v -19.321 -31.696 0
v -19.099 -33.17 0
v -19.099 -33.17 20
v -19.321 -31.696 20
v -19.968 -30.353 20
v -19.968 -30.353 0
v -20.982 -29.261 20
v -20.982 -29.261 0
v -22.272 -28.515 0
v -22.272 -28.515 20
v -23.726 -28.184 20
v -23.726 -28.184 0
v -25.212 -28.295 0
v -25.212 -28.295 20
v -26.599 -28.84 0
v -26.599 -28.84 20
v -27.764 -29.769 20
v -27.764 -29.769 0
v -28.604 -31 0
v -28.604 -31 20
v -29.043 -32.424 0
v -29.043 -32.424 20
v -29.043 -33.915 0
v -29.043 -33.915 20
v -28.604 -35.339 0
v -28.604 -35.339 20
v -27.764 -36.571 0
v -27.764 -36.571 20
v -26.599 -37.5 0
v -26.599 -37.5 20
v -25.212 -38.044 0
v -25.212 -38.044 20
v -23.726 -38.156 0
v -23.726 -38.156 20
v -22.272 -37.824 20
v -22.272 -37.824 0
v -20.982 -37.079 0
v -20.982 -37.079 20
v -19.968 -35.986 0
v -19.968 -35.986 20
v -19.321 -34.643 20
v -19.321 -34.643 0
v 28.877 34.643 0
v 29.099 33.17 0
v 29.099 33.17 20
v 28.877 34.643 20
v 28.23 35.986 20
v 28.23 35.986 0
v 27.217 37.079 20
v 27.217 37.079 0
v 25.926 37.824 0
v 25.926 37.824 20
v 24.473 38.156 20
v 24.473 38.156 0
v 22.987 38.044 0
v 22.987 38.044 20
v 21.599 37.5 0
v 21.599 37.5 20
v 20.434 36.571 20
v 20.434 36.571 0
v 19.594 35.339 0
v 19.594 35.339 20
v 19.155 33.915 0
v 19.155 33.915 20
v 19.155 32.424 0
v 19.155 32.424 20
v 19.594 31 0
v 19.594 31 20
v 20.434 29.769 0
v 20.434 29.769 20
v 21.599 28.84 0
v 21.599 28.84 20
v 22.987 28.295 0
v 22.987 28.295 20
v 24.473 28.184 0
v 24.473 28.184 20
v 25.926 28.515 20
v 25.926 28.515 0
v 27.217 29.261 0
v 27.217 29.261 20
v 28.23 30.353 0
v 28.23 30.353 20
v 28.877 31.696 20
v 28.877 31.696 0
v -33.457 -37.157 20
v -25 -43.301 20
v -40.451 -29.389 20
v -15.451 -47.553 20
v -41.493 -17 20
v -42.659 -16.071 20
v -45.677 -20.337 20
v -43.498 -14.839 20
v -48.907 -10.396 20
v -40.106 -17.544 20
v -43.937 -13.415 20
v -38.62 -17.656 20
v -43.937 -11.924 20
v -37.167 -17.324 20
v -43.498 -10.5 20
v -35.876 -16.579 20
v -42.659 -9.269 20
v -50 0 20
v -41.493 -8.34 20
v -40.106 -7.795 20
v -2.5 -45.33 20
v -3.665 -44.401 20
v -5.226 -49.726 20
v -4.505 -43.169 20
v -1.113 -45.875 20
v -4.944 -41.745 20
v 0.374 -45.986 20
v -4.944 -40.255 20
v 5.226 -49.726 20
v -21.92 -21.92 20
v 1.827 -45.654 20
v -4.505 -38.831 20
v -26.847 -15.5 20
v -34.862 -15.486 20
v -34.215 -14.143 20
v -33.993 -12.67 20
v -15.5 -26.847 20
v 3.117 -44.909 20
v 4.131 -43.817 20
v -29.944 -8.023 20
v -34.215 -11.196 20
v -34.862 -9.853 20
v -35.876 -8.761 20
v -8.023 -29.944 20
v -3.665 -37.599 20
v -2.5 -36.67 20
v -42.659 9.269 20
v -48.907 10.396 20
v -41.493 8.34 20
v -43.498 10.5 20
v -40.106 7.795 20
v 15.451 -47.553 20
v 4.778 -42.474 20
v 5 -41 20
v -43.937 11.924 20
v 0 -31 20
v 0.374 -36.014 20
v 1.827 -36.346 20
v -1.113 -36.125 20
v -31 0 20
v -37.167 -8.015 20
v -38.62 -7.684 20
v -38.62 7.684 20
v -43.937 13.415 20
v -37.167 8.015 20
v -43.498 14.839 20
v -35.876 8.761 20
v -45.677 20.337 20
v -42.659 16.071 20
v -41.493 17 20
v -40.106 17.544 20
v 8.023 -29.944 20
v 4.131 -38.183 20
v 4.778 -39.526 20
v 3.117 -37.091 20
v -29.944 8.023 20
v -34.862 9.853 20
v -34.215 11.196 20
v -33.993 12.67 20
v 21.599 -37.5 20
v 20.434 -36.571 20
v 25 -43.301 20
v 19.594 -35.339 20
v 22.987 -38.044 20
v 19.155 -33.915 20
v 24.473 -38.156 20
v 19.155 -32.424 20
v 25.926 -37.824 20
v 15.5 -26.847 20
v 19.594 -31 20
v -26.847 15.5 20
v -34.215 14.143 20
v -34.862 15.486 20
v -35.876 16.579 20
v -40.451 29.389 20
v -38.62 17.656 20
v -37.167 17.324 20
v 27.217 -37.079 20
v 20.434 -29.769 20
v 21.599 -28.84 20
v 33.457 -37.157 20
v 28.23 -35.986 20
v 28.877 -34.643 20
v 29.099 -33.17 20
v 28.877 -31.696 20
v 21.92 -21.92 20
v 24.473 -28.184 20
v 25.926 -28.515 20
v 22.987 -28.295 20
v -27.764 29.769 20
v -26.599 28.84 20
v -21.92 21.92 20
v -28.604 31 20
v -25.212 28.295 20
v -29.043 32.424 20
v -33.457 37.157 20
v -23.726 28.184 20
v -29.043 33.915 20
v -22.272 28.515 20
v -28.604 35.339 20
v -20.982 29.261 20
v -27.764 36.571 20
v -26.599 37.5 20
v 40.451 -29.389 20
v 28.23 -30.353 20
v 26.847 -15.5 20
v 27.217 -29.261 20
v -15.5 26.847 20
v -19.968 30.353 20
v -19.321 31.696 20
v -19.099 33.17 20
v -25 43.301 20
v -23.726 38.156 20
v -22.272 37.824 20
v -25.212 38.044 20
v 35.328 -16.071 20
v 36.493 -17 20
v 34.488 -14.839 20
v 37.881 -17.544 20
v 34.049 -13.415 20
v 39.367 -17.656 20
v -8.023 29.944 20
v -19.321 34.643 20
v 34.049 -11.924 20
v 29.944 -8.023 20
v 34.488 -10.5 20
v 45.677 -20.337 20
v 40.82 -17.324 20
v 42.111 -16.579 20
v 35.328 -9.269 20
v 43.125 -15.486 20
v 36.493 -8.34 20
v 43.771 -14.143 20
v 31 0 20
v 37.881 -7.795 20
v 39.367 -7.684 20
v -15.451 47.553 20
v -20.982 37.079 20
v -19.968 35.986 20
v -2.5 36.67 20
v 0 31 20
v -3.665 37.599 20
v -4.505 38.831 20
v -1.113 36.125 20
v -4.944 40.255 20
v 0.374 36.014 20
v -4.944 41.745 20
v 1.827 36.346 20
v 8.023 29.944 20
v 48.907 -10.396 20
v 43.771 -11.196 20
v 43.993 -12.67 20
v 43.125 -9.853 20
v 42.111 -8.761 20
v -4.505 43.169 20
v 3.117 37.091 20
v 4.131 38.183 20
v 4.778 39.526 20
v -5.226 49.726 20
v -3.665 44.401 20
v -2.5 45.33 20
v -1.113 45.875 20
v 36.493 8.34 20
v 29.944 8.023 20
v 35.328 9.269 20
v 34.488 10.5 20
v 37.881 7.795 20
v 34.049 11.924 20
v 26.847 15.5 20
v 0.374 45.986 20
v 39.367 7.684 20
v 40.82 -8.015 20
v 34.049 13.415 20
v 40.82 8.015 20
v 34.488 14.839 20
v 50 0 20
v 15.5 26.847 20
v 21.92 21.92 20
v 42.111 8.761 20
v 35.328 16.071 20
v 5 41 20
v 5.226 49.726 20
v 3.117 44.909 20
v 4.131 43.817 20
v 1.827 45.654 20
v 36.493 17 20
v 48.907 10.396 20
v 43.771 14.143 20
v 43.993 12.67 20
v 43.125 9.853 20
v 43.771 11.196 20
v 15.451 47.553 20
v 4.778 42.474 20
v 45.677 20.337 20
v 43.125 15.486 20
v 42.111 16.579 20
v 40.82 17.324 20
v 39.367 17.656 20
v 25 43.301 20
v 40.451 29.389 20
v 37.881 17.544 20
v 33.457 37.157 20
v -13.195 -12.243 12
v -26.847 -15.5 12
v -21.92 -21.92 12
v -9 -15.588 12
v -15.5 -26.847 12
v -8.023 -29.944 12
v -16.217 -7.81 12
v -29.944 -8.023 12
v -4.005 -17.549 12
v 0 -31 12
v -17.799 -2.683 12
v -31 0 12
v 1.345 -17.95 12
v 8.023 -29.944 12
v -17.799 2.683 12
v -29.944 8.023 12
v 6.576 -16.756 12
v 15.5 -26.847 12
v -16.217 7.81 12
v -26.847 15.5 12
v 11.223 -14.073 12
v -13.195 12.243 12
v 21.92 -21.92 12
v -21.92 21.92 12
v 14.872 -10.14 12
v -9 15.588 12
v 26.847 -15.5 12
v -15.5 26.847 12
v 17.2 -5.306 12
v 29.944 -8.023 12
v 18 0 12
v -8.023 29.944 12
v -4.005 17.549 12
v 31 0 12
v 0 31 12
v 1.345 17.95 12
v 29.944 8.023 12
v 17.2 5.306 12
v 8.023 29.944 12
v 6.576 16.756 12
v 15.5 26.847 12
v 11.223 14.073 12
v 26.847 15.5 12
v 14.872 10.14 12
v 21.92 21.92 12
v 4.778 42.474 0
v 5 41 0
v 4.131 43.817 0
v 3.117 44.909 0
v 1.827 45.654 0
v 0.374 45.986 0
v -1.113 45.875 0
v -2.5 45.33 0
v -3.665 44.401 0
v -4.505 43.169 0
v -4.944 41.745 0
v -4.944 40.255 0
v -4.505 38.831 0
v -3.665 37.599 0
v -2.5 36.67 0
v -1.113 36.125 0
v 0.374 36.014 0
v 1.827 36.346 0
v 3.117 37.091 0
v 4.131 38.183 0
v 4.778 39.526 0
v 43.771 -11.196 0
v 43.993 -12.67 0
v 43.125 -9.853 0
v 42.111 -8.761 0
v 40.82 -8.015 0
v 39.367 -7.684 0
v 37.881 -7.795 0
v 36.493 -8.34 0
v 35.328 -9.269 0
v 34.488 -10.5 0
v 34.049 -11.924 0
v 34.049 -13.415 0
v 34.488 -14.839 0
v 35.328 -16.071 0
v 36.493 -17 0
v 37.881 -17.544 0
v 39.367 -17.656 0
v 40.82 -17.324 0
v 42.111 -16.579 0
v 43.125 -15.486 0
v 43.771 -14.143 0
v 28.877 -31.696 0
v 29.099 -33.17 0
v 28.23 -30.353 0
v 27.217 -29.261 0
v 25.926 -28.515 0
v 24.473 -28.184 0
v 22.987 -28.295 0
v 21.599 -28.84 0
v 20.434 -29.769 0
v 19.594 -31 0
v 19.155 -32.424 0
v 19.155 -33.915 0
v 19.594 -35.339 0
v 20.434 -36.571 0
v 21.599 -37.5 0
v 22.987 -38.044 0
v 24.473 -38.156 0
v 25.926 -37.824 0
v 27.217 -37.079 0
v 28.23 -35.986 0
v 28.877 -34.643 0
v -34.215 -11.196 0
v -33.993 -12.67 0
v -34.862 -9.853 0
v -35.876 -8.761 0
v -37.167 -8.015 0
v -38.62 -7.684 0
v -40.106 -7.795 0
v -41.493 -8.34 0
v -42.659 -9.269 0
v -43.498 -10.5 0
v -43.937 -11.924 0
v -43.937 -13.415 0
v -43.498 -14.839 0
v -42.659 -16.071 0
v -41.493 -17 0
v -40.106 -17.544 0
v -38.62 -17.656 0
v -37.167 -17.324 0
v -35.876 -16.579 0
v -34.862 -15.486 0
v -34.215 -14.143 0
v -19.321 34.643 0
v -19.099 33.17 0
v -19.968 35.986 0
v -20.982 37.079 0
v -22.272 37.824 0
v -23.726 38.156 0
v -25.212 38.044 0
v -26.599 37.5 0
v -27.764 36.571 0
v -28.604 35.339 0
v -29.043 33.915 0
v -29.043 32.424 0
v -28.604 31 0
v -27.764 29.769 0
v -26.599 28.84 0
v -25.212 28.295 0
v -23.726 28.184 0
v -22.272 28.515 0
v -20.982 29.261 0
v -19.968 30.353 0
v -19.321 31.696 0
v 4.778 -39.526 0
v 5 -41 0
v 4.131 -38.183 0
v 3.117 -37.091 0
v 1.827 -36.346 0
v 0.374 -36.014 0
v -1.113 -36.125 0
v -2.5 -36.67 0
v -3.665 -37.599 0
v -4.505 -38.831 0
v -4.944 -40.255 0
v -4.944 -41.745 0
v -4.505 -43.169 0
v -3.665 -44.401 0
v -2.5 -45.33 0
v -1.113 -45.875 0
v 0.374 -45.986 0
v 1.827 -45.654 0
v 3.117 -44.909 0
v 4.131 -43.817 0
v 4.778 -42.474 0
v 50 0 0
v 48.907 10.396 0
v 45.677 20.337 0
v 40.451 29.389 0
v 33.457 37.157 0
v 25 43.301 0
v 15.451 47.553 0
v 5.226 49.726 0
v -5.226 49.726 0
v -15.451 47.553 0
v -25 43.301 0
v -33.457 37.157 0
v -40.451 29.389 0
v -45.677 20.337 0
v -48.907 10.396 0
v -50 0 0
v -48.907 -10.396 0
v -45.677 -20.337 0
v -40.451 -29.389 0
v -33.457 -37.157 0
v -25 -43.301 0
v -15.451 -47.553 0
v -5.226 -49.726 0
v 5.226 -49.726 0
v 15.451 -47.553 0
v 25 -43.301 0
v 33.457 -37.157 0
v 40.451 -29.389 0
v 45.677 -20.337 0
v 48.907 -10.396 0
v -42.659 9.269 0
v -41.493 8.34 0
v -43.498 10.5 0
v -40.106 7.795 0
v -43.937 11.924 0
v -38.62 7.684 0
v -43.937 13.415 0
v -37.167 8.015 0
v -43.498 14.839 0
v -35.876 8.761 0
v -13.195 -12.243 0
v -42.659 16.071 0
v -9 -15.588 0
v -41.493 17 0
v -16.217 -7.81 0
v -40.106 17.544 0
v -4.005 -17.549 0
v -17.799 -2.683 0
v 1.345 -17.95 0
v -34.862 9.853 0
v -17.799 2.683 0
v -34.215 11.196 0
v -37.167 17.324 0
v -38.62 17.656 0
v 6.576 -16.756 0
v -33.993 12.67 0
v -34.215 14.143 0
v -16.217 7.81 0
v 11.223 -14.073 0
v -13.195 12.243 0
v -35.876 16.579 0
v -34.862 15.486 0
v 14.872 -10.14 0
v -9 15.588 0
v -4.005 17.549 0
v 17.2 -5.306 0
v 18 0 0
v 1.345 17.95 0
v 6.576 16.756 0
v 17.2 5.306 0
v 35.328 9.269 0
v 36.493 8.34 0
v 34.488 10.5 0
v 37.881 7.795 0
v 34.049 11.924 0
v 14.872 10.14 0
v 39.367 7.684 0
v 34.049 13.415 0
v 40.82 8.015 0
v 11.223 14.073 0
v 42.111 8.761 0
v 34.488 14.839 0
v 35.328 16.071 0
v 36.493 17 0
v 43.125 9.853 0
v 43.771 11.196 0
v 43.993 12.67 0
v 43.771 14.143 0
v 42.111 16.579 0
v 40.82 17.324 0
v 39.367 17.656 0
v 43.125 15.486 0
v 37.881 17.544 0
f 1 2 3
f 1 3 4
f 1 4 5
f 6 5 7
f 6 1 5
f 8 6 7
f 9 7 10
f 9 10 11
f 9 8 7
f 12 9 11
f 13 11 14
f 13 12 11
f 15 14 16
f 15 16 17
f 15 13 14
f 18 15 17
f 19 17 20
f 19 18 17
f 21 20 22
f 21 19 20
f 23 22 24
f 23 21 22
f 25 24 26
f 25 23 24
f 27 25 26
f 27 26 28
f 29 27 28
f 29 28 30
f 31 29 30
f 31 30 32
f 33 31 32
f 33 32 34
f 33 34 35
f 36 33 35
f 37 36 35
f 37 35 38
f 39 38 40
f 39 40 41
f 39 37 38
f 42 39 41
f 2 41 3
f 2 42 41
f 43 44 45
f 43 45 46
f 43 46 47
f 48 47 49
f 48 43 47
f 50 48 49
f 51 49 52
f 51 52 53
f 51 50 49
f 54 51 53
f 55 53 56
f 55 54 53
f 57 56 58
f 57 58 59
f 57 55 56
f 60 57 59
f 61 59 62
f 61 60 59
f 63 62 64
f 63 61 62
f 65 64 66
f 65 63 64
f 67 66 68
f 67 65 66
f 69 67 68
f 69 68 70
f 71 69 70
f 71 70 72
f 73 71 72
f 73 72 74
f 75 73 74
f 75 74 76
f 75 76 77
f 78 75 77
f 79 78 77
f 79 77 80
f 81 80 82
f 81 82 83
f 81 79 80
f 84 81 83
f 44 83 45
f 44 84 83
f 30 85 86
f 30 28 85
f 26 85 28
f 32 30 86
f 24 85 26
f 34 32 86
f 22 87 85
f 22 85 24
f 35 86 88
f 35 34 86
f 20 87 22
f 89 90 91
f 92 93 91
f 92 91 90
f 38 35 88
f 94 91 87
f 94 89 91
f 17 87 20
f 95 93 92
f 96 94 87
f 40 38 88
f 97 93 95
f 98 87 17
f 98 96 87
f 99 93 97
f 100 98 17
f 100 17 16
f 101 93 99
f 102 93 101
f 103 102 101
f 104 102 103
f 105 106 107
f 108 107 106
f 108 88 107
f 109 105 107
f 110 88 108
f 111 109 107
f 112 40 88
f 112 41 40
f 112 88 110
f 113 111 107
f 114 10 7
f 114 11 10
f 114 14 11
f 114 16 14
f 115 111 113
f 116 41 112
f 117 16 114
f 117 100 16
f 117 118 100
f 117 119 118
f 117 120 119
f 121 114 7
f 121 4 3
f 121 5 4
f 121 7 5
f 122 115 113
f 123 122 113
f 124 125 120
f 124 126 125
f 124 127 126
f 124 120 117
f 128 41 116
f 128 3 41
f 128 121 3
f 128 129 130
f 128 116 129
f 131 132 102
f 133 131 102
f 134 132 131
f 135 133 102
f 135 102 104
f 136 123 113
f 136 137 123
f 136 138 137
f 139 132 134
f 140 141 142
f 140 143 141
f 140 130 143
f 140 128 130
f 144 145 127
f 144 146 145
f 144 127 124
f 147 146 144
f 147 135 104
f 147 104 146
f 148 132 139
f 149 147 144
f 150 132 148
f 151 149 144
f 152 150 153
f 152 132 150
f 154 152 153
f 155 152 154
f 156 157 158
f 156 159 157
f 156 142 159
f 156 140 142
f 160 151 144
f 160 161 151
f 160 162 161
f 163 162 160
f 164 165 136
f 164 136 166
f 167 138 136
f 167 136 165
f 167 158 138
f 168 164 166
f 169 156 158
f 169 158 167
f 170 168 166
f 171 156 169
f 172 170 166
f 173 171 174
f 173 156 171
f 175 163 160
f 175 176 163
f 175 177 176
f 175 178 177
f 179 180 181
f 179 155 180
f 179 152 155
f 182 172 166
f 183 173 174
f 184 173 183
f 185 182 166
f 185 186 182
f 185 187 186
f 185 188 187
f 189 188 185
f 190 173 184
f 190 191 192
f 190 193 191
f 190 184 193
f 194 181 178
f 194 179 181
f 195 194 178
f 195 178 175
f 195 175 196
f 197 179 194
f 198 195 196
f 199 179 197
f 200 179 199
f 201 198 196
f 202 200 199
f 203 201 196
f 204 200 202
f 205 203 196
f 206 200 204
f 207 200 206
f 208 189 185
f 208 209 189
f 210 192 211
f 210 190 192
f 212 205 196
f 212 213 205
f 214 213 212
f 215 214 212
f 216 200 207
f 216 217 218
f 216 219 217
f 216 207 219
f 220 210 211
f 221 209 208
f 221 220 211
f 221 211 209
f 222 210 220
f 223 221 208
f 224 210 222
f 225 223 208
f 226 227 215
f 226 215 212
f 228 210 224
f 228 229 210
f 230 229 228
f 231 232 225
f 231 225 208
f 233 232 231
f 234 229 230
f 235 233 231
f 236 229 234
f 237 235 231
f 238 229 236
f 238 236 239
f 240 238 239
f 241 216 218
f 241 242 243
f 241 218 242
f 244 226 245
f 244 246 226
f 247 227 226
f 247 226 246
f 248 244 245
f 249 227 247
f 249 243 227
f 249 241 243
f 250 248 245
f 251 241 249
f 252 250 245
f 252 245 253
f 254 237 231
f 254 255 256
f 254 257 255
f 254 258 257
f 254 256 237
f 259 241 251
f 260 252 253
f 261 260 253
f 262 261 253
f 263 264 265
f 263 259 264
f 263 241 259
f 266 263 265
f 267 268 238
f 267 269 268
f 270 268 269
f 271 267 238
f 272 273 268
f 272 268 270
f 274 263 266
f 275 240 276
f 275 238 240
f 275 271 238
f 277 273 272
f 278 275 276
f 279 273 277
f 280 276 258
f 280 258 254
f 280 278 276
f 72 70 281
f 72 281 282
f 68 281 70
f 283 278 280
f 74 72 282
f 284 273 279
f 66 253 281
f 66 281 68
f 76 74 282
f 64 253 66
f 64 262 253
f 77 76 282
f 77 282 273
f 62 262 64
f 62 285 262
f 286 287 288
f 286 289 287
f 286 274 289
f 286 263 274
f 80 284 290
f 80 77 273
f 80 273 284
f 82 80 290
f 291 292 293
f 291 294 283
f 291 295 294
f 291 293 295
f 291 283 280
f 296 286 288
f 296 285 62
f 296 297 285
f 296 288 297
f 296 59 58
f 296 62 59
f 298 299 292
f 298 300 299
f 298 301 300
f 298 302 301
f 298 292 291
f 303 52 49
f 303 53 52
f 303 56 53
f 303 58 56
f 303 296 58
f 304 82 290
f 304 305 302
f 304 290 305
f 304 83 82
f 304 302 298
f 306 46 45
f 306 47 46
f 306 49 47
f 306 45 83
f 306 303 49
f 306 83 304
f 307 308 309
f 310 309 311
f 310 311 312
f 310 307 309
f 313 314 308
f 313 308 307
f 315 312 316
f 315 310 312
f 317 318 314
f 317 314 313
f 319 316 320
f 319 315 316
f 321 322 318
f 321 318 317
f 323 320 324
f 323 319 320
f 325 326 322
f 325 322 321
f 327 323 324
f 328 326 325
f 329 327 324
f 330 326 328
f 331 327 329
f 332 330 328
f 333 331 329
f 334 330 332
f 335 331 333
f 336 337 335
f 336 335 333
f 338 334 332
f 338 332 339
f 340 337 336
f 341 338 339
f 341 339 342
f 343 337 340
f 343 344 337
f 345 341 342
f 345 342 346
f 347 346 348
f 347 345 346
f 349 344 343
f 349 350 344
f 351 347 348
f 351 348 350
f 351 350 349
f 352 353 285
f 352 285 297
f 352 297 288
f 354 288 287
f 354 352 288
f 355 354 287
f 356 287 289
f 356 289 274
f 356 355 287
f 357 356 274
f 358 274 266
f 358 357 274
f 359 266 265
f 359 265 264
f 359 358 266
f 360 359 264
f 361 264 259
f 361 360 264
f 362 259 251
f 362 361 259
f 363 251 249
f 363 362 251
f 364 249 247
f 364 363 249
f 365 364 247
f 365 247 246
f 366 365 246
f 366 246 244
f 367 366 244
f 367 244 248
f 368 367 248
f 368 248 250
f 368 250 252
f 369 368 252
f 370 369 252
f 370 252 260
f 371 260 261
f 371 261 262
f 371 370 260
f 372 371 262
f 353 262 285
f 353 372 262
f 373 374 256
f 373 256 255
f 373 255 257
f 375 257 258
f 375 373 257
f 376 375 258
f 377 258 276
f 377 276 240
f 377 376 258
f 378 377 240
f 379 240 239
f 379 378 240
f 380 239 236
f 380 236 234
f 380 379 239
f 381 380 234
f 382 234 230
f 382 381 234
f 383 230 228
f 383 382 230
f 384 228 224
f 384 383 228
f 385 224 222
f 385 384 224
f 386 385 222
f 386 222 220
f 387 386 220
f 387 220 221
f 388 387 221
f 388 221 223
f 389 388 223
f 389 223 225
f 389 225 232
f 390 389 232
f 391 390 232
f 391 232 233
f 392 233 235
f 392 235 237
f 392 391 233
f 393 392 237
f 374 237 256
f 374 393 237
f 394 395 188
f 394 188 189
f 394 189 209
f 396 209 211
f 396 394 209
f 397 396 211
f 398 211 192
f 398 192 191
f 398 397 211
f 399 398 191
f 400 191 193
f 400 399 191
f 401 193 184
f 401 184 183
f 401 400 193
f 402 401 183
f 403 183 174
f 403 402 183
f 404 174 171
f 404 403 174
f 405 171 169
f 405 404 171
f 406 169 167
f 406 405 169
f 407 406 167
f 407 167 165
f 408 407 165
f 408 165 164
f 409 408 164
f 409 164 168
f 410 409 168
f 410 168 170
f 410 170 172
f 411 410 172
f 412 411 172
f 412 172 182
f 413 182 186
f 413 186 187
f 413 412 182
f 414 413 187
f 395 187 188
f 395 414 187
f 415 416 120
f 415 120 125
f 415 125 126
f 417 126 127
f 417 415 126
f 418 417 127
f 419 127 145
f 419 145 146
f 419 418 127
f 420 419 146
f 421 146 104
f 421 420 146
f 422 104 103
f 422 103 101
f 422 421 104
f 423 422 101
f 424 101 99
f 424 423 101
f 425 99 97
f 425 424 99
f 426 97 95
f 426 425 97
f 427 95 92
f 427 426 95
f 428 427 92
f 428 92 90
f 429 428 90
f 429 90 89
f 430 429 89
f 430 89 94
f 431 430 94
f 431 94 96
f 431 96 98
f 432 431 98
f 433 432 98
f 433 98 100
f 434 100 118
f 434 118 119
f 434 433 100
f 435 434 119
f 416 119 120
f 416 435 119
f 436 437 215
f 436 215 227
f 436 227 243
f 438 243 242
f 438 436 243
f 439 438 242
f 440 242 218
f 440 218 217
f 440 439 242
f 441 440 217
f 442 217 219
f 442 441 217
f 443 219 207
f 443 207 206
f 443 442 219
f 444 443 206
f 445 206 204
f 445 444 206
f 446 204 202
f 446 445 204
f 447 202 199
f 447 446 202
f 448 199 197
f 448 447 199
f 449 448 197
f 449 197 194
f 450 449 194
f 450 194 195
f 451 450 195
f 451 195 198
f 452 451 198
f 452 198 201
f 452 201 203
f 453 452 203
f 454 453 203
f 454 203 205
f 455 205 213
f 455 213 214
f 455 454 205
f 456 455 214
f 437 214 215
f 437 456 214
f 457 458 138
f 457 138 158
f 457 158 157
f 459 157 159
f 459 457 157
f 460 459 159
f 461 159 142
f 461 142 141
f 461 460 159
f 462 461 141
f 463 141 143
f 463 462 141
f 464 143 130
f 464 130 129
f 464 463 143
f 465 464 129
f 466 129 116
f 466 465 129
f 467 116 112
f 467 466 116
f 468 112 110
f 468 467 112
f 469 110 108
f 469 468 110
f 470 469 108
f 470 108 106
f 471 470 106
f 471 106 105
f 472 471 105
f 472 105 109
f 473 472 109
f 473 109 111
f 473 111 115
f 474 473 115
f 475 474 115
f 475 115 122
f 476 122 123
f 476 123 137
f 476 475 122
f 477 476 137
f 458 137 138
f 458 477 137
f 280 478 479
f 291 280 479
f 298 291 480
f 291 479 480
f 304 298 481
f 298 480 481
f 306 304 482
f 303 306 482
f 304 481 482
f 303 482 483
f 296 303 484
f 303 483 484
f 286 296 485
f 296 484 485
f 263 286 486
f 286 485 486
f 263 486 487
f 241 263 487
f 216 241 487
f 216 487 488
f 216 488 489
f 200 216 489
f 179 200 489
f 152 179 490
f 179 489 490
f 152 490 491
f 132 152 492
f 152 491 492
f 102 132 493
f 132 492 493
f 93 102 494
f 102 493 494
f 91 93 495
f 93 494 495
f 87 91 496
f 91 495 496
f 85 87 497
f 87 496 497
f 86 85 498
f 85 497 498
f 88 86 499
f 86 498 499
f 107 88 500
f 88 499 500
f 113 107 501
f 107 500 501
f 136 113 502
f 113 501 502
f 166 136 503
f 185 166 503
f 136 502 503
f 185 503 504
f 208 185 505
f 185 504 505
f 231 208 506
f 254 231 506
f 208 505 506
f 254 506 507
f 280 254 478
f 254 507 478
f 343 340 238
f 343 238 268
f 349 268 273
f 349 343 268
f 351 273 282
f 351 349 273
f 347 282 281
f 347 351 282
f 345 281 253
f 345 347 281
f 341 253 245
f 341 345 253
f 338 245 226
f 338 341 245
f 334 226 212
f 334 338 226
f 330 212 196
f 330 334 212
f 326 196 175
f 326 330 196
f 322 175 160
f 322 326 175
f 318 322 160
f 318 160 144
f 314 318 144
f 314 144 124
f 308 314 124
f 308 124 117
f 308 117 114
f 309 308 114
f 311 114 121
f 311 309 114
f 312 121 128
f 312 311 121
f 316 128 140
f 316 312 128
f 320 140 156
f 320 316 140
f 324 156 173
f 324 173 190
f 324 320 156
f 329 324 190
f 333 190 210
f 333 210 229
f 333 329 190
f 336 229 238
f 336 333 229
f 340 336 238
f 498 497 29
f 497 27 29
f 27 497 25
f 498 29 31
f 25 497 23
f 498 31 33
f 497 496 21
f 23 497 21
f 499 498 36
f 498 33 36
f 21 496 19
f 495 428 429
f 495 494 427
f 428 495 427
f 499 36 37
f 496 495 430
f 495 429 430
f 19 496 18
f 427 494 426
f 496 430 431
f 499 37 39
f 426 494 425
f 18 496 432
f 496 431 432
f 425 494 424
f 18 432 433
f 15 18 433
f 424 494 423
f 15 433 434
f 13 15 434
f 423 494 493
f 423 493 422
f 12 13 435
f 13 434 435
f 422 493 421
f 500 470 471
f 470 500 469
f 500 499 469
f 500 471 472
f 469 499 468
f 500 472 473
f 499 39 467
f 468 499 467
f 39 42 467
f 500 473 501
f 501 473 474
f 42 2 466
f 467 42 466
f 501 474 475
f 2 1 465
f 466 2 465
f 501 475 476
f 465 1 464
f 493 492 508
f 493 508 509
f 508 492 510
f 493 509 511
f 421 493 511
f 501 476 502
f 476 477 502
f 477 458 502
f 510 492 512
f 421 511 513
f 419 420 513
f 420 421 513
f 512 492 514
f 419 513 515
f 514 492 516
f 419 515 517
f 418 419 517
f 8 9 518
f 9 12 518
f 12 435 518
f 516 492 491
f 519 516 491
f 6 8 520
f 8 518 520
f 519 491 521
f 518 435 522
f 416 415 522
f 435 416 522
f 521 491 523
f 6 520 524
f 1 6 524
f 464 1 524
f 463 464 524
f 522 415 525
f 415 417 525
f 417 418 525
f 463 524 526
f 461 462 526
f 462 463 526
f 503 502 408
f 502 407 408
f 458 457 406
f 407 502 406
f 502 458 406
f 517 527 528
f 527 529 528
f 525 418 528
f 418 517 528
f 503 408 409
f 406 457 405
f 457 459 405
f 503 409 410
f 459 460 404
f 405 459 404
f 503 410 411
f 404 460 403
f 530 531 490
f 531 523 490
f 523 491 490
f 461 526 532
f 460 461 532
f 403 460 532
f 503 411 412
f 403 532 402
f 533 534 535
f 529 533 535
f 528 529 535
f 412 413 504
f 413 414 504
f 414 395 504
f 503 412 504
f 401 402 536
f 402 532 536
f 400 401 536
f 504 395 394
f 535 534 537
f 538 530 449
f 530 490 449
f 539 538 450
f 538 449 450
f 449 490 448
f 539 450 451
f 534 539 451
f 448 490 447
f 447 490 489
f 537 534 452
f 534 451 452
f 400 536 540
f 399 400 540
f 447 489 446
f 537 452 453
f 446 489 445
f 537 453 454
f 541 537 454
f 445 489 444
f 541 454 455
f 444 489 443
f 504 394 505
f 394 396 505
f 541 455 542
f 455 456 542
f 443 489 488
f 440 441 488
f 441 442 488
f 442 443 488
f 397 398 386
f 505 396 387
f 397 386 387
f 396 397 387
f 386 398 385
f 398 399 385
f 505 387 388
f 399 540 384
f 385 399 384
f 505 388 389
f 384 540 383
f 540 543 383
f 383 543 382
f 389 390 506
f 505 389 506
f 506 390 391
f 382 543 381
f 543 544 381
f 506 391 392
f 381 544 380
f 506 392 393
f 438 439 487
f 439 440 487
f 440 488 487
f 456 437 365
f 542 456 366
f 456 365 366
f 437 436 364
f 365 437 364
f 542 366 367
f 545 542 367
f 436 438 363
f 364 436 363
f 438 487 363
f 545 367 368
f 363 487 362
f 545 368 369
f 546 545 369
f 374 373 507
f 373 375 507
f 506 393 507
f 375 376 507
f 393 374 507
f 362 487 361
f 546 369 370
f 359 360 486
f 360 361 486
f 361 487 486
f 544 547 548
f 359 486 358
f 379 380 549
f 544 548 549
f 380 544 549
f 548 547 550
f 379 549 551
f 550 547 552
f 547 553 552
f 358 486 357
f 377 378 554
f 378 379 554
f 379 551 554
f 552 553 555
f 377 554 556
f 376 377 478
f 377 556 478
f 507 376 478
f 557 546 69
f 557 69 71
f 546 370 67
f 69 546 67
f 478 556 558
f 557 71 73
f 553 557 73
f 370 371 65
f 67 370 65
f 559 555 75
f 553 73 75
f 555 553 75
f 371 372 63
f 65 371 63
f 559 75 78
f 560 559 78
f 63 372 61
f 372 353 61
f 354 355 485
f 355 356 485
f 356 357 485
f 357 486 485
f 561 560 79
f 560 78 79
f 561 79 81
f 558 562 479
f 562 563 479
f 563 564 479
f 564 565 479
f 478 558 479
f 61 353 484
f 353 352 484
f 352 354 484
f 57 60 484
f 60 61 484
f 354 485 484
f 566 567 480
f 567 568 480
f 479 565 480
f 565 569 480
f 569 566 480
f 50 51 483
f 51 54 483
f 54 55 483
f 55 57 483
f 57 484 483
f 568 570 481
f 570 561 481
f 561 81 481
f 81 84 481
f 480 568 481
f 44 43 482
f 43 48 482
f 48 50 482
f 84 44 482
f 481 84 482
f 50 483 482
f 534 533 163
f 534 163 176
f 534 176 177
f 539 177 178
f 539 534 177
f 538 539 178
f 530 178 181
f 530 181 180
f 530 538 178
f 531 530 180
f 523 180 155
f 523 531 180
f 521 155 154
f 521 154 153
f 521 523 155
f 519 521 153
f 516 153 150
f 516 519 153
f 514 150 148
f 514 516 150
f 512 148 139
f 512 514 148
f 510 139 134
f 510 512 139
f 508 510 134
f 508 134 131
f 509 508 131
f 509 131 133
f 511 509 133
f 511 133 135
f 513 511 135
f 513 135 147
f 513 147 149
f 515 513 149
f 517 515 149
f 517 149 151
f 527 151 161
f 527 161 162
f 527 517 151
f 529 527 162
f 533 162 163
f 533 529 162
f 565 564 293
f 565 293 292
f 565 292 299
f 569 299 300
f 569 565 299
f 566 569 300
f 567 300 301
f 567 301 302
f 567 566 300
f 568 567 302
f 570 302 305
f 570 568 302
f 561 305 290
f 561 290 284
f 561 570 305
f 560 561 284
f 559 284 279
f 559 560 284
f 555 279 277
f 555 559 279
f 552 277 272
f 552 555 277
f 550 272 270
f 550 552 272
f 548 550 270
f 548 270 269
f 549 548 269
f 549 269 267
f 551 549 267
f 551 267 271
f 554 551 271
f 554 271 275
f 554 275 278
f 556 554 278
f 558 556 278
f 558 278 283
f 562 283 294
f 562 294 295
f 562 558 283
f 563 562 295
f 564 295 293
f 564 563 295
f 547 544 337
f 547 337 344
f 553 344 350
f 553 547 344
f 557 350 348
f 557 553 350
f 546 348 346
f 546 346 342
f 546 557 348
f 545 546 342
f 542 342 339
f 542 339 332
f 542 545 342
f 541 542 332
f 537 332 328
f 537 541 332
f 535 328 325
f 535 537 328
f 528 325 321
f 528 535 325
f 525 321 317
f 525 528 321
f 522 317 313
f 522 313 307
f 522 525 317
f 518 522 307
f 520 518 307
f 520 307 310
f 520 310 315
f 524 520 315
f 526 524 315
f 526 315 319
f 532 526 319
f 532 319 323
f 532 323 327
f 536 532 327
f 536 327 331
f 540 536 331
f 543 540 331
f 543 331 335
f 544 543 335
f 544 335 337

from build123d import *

# Parameters (mm, degrees)
SKETCH1_R           = 50
SKETCH1_R_2         = 18
SKETCH1_R_3         = 5
BOSS_EXTRUDE1_DEPTH = 20
CUT_EXTRUDE1_START  = -8
SKETCH2_R           = 31
SKETCH2_R_2         = 18
CUT_EXTRUDE1_DEPTH  = 8


with BuildPart() as part:
    # Sketch1 → Boss-Extrude1 (new body)
    with BuildSketch(Plane.XY):
        Circle(SKETCH1_R)
        Circle(SKETCH1_R_2, mode=Mode.SUBTRACT)
        with Locations((0, -41)):
            Circle(SKETCH1_R_3, mode=Mode.SUBTRACT)
        with Locations((-24.099195344, -33.169696769)):
            Circle(SKETCH1_R_3, mode=Mode.SUBTRACT)
        with Locations((-38.993317168, -12.669696769)):
            Circle(SKETCH1_R_3, mode=Mode.SUBTRACT)
        with Locations((-38.993317168, 12.669696769)):
            Circle(SKETCH1_R_3, mode=Mode.SUBTRACT)
        with Locations((-24.099195344, 33.169696769)):
            Circle(SKETCH1_R_3, mode=Mode.SUBTRACT)
        with Locations((0, 41)):
            Circle(SKETCH1_R_3, mode=Mode.SUBTRACT)
        with Locations((24.099195344, 33.169696769)):
            Circle(SKETCH1_R_3, mode=Mode.SUBTRACT)
        with Locations((38.993317168, 12.669696769)):
            Circle(SKETCH1_R_3, mode=Mode.SUBTRACT)
        with Locations((38.993317168, -12.669696769)):
            Circle(SKETCH1_R_3, mode=Mode.SUBTRACT)
        with Locations((24.099195344, -33.169696769)):
            Circle(SKETCH1_R_3, mode=Mode.SUBTRACT)
    extrude(amount=BOSS_EXTRUDE1_DEPTH)

    # Sketch2 → Cut-Extrude1 (cut)
    with BuildSketch(Plane.XY.offset(20).offset(CUT_EXTRUDE1_START)):
        Circle(SKETCH2_R)
        Circle(SKETCH2_R_2, mode=Mode.SUBTRACT)
    extrude(amount=CUT_EXTRUDE1_DEPTH, mode=Mode.SUBTRACT)


solid = part.part
